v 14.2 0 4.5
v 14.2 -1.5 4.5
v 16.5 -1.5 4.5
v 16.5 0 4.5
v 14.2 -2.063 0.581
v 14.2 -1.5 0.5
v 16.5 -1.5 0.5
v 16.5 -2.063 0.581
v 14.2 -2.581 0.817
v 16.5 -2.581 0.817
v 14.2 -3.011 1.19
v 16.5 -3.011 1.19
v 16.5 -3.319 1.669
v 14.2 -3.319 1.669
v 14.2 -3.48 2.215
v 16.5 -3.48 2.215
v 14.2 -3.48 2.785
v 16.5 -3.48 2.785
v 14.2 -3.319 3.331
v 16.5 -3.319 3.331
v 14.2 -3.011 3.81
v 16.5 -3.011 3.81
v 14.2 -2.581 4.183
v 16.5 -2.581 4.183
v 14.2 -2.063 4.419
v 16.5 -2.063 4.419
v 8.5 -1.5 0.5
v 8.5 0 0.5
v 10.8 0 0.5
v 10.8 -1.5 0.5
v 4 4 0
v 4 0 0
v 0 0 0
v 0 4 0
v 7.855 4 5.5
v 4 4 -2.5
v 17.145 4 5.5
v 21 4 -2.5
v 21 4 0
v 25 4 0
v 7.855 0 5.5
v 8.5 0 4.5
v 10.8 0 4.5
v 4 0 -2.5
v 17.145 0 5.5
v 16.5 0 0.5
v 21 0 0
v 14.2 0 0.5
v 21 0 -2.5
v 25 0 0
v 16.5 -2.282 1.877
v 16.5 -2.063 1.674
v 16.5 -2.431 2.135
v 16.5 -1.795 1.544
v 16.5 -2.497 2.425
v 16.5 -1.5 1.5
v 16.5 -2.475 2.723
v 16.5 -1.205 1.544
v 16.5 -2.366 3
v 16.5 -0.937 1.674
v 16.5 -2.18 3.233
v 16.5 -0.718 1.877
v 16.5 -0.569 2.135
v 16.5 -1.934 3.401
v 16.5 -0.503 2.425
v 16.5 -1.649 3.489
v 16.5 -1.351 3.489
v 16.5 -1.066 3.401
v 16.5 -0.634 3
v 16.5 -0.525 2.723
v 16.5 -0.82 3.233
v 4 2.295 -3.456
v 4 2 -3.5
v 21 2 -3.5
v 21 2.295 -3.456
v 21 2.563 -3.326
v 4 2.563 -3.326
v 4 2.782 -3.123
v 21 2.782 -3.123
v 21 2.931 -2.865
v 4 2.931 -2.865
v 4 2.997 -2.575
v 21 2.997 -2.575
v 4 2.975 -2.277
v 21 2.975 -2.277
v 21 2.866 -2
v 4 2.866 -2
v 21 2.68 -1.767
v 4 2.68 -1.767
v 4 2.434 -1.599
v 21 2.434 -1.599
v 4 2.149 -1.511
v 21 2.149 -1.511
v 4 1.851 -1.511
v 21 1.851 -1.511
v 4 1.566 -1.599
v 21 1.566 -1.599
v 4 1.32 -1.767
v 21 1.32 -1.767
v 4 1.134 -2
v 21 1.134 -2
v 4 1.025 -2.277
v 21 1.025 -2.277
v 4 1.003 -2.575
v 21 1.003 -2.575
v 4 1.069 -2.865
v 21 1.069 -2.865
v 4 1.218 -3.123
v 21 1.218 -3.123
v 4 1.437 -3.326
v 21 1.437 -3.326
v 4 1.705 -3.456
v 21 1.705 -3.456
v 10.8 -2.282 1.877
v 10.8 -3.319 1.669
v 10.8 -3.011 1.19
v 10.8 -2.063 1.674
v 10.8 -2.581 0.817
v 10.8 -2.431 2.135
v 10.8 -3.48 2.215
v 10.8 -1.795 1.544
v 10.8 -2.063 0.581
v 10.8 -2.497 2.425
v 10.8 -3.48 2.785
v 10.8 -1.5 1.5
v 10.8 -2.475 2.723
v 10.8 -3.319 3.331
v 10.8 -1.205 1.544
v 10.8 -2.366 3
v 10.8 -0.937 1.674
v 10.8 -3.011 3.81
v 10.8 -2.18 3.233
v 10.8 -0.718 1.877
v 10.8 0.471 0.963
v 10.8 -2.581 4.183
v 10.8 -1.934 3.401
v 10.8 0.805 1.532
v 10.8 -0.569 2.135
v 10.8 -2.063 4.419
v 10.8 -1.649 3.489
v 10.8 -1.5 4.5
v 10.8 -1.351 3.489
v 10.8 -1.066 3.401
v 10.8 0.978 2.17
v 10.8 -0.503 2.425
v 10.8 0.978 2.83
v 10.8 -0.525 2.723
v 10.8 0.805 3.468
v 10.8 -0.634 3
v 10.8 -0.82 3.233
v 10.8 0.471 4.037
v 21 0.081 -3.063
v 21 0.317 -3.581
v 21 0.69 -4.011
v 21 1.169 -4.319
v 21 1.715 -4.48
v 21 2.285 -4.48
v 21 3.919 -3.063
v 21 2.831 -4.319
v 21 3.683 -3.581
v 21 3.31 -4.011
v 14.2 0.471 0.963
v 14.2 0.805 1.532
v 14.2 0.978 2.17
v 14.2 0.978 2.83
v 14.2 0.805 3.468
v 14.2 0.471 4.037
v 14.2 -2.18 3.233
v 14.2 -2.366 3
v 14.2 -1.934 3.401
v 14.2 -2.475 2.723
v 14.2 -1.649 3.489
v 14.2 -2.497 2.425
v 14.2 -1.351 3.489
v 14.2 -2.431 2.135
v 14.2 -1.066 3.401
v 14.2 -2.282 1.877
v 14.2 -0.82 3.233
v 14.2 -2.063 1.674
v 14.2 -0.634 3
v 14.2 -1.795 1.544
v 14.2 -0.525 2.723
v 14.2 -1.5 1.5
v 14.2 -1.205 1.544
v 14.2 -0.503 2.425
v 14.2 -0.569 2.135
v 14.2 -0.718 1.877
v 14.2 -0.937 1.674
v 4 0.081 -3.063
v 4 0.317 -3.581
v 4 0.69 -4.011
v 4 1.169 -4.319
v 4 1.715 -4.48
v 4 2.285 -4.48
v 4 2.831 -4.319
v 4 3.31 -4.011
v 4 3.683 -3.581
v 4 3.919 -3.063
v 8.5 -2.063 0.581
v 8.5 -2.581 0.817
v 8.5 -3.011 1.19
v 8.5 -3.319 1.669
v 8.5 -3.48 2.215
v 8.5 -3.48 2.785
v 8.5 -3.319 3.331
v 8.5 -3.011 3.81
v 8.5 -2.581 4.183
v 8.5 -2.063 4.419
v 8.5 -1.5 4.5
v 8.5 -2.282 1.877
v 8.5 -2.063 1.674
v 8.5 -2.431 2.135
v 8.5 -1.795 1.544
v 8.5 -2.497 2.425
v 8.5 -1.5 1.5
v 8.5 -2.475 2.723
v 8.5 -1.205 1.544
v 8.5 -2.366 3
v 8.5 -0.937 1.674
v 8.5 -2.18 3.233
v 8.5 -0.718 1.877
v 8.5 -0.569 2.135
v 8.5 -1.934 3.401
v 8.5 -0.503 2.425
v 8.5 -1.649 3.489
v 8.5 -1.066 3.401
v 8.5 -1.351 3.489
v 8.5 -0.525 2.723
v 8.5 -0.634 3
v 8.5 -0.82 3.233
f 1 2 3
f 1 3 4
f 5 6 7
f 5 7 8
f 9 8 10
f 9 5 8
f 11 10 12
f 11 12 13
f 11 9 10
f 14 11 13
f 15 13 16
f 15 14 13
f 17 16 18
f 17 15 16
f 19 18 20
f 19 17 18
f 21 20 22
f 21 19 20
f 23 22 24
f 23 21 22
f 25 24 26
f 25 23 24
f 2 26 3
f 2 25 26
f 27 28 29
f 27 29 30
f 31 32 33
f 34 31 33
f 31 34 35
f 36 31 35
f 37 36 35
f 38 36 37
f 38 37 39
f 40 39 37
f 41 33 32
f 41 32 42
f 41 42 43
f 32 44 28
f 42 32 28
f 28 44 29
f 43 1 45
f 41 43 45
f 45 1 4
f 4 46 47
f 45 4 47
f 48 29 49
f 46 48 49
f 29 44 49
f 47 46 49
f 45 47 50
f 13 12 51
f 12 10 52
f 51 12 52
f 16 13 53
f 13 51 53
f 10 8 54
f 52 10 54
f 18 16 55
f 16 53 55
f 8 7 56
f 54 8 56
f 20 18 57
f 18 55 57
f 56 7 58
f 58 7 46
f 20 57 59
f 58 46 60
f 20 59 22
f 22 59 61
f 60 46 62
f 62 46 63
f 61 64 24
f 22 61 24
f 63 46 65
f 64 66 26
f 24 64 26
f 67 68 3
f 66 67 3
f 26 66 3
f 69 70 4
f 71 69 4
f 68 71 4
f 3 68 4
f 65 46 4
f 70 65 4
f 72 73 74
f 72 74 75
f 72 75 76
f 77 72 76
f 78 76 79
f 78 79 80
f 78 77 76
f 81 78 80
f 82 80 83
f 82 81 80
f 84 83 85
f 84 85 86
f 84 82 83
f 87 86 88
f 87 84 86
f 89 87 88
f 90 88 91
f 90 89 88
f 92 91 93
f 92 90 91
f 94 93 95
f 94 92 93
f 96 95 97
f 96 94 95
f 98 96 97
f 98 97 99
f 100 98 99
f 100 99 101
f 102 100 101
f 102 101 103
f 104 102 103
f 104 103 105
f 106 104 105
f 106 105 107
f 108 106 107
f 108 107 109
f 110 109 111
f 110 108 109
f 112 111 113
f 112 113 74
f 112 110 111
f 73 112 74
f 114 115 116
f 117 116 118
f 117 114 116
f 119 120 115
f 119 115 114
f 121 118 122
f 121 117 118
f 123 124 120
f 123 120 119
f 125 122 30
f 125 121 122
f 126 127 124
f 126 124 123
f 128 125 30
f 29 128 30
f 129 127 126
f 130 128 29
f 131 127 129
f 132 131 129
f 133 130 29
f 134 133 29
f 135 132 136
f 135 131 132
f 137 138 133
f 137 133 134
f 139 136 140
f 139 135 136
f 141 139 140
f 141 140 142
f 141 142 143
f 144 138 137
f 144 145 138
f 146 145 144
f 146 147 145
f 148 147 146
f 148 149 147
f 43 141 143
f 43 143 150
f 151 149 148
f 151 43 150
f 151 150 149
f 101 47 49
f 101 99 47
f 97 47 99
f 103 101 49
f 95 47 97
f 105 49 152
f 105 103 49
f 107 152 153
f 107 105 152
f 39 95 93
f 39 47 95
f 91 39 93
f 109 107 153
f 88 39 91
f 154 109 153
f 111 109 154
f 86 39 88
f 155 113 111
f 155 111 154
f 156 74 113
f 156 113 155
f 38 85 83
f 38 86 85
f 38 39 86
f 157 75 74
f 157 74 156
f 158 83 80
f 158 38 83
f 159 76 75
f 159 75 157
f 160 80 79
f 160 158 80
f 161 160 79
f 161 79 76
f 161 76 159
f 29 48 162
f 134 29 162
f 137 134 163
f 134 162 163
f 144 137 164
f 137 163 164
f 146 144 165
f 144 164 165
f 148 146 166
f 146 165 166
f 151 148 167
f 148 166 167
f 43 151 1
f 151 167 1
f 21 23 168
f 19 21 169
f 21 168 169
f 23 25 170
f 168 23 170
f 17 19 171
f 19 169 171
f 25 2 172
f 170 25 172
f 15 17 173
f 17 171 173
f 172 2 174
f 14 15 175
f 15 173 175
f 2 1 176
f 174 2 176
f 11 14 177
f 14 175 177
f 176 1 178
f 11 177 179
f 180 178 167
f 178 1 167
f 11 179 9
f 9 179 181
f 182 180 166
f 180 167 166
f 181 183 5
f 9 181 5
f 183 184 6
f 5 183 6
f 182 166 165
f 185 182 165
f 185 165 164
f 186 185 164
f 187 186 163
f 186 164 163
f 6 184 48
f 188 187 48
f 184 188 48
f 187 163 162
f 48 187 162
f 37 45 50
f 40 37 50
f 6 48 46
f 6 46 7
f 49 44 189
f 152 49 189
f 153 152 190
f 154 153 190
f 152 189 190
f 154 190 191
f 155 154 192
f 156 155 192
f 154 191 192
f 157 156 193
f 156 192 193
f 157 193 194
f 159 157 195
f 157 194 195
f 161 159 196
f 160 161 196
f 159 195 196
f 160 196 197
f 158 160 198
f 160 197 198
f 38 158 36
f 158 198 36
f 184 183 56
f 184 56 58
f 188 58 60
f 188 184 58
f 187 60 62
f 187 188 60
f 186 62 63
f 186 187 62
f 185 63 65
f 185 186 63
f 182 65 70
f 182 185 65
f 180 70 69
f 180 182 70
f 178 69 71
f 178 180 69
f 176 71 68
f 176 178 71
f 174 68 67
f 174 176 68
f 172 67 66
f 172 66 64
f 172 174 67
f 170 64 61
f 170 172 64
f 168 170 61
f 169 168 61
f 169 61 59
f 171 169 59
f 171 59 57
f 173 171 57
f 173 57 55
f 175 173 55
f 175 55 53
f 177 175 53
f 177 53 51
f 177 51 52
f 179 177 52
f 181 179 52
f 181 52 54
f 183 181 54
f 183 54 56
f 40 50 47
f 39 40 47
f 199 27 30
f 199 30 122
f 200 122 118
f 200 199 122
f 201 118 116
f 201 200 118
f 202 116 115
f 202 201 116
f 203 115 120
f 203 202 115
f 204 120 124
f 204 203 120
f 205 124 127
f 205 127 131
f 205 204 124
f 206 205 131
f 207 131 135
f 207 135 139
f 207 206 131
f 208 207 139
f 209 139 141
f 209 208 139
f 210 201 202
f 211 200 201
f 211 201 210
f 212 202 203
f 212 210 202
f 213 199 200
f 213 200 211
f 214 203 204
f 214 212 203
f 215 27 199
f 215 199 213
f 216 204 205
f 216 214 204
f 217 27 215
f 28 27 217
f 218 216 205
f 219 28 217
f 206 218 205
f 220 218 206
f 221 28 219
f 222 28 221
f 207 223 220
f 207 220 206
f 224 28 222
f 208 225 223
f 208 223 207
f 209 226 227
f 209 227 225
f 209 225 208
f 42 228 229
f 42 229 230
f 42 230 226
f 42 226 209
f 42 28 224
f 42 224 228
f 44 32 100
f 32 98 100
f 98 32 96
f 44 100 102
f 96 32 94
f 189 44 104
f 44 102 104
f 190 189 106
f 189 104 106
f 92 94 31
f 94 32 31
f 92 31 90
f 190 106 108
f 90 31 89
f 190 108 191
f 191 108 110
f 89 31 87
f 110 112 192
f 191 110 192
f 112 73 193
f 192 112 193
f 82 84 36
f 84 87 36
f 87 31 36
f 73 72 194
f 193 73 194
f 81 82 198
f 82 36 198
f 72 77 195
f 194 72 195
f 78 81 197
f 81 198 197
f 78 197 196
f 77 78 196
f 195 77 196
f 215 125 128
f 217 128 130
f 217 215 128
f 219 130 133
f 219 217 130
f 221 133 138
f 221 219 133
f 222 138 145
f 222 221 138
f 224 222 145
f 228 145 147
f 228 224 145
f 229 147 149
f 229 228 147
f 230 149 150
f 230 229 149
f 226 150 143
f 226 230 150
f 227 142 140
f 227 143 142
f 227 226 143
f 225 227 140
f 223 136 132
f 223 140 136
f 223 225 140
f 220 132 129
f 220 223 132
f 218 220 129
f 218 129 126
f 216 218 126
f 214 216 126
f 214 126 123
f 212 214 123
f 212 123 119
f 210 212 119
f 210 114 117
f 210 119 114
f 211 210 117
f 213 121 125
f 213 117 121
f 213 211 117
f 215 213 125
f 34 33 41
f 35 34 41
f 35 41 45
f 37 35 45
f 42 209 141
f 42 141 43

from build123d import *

# Parameters (mm, degrees)
BOSS_EXTRUDE1_DEPTH      = 4
BOSS_EXTRUDE2_START      = 4
SKETCH2_R                = 1
BOSS_EXTRUDE2_DEPTH      = 17
BOSS_EXTRUDE3_DEPTH      = 4
BOSS_EXTRUDE3_DEPTH_BACK = 4
BOSS_EXTRUDE3_START      = 12.5
SKETCH3_R                = 1
CUT_EXTRUDE1_REACH       = 29.221
SKETCH4_W                = 3.4
SKETCH4_H                = 3.5
CUT_EXTRUDE2_DEPTH       = 3.4


with BuildPart() as part:
    # Sketch1 → Boss-Extrude1 (new body)
    with BuildSketch(Plane(origin=(0, 0, 0), x_dir=(1, 0, 0), z_dir=(0, 1, 0))):
        Polygon((0, 0), (7.854814037, -5.5), (17.145185963, -5.5), (25, 0), align=None)
    extrude(amount=BOSS_EXTRUDE1_DEPTH)

    # Sketch2 → Boss-Extrude2 (add)
    with BuildSketch(Plane(origin=(0, 0, 0), x_dir=(0, 0, -1), z_dir=(1, 0, 0)).offset(BOSS_EXTRUDE2_START)):
        with BuildLine():
            Line((0, 0), (2.5, 0))
            ThreePointArc((2.5, 0), (4.5, 2), (2.5, 4))
            Line((2.5, 4), (0, 4))
            Line((0, 4), (0, 0))
        make_face()
        with Locations((2.5, 2)):
            Circle(SKETCH2_R, mode=Mode.SUBTRACT)
    extrude(amount=BOSS_EXTRUDE2_DEPTH)

    # Sketch3 → Boss-Extrude3 (add, two sides: drawn at the far end of the back side and taken through both)
    with BuildSketch(Plane(origin=(0, 0, 0), x_dir=(0, 0, -1), z_dir=(1, 0, 0)).offset(BOSS_EXTRUDE3_START - BOSS_EXTRUDE3_DEPTH_BACK)):
        with BuildLine():
            Line((-4.5, 0), (-0.5, 0))
            Line((-0.5, 0), (-0.5, -1.5))
            ThreePointArc((-0.5, -1.5), (-2.5, -3.5), (-4.5, -1.5))
            Line((-4.5, -1.5), (-4.5, 0))
        make_face()
        with Locations((-2.5, -1.5)):
            Circle(SKETCH3_R, mode=Mode.SUBTRACT)
    extrude(amount=BOSS_EXTRUDE3_DEPTH + BOSS_EXTRUDE3_DEPTH_BACK)

    # Sketch4 → Cut-Extrude1 (cut, up to next)
    with BuildSketch(Plane.XY.offset(5.5), mode=Mode.PRIVATE) as cut_extrude1_sk1:
        with Locations((12.5, -1.75)):
            Rectangle(SKETCH4_W, SKETCH4_H)
    cut_extrude1_tool1 = extrude(cut_extrude1_sk1.sketch, amount=-CUT_EXTRUDE1_REACH, mode=Mode.PRIVATE) & part.part
    add(cut_extrude1_tool1.solids().sort_by_distance((12.5, -1.75, 5.5))[0], mode=Mode.SUBTRACT)

    # Sketch5 → Cut-Extrude2 (cut)
    with BuildSketch(Plane.ZY.offset(-14.2)):
        with BuildLine():
            Line((4.5, 0), (0.5, 0))
            ThreePointArc((0.5, 0), (2.5, 1), (4.5, 0))
        make_face()
    extrude(amount=CUT_EXTRUDE2_DEPTH, mode=Mode.SUBTRACT)


solid = part.part
